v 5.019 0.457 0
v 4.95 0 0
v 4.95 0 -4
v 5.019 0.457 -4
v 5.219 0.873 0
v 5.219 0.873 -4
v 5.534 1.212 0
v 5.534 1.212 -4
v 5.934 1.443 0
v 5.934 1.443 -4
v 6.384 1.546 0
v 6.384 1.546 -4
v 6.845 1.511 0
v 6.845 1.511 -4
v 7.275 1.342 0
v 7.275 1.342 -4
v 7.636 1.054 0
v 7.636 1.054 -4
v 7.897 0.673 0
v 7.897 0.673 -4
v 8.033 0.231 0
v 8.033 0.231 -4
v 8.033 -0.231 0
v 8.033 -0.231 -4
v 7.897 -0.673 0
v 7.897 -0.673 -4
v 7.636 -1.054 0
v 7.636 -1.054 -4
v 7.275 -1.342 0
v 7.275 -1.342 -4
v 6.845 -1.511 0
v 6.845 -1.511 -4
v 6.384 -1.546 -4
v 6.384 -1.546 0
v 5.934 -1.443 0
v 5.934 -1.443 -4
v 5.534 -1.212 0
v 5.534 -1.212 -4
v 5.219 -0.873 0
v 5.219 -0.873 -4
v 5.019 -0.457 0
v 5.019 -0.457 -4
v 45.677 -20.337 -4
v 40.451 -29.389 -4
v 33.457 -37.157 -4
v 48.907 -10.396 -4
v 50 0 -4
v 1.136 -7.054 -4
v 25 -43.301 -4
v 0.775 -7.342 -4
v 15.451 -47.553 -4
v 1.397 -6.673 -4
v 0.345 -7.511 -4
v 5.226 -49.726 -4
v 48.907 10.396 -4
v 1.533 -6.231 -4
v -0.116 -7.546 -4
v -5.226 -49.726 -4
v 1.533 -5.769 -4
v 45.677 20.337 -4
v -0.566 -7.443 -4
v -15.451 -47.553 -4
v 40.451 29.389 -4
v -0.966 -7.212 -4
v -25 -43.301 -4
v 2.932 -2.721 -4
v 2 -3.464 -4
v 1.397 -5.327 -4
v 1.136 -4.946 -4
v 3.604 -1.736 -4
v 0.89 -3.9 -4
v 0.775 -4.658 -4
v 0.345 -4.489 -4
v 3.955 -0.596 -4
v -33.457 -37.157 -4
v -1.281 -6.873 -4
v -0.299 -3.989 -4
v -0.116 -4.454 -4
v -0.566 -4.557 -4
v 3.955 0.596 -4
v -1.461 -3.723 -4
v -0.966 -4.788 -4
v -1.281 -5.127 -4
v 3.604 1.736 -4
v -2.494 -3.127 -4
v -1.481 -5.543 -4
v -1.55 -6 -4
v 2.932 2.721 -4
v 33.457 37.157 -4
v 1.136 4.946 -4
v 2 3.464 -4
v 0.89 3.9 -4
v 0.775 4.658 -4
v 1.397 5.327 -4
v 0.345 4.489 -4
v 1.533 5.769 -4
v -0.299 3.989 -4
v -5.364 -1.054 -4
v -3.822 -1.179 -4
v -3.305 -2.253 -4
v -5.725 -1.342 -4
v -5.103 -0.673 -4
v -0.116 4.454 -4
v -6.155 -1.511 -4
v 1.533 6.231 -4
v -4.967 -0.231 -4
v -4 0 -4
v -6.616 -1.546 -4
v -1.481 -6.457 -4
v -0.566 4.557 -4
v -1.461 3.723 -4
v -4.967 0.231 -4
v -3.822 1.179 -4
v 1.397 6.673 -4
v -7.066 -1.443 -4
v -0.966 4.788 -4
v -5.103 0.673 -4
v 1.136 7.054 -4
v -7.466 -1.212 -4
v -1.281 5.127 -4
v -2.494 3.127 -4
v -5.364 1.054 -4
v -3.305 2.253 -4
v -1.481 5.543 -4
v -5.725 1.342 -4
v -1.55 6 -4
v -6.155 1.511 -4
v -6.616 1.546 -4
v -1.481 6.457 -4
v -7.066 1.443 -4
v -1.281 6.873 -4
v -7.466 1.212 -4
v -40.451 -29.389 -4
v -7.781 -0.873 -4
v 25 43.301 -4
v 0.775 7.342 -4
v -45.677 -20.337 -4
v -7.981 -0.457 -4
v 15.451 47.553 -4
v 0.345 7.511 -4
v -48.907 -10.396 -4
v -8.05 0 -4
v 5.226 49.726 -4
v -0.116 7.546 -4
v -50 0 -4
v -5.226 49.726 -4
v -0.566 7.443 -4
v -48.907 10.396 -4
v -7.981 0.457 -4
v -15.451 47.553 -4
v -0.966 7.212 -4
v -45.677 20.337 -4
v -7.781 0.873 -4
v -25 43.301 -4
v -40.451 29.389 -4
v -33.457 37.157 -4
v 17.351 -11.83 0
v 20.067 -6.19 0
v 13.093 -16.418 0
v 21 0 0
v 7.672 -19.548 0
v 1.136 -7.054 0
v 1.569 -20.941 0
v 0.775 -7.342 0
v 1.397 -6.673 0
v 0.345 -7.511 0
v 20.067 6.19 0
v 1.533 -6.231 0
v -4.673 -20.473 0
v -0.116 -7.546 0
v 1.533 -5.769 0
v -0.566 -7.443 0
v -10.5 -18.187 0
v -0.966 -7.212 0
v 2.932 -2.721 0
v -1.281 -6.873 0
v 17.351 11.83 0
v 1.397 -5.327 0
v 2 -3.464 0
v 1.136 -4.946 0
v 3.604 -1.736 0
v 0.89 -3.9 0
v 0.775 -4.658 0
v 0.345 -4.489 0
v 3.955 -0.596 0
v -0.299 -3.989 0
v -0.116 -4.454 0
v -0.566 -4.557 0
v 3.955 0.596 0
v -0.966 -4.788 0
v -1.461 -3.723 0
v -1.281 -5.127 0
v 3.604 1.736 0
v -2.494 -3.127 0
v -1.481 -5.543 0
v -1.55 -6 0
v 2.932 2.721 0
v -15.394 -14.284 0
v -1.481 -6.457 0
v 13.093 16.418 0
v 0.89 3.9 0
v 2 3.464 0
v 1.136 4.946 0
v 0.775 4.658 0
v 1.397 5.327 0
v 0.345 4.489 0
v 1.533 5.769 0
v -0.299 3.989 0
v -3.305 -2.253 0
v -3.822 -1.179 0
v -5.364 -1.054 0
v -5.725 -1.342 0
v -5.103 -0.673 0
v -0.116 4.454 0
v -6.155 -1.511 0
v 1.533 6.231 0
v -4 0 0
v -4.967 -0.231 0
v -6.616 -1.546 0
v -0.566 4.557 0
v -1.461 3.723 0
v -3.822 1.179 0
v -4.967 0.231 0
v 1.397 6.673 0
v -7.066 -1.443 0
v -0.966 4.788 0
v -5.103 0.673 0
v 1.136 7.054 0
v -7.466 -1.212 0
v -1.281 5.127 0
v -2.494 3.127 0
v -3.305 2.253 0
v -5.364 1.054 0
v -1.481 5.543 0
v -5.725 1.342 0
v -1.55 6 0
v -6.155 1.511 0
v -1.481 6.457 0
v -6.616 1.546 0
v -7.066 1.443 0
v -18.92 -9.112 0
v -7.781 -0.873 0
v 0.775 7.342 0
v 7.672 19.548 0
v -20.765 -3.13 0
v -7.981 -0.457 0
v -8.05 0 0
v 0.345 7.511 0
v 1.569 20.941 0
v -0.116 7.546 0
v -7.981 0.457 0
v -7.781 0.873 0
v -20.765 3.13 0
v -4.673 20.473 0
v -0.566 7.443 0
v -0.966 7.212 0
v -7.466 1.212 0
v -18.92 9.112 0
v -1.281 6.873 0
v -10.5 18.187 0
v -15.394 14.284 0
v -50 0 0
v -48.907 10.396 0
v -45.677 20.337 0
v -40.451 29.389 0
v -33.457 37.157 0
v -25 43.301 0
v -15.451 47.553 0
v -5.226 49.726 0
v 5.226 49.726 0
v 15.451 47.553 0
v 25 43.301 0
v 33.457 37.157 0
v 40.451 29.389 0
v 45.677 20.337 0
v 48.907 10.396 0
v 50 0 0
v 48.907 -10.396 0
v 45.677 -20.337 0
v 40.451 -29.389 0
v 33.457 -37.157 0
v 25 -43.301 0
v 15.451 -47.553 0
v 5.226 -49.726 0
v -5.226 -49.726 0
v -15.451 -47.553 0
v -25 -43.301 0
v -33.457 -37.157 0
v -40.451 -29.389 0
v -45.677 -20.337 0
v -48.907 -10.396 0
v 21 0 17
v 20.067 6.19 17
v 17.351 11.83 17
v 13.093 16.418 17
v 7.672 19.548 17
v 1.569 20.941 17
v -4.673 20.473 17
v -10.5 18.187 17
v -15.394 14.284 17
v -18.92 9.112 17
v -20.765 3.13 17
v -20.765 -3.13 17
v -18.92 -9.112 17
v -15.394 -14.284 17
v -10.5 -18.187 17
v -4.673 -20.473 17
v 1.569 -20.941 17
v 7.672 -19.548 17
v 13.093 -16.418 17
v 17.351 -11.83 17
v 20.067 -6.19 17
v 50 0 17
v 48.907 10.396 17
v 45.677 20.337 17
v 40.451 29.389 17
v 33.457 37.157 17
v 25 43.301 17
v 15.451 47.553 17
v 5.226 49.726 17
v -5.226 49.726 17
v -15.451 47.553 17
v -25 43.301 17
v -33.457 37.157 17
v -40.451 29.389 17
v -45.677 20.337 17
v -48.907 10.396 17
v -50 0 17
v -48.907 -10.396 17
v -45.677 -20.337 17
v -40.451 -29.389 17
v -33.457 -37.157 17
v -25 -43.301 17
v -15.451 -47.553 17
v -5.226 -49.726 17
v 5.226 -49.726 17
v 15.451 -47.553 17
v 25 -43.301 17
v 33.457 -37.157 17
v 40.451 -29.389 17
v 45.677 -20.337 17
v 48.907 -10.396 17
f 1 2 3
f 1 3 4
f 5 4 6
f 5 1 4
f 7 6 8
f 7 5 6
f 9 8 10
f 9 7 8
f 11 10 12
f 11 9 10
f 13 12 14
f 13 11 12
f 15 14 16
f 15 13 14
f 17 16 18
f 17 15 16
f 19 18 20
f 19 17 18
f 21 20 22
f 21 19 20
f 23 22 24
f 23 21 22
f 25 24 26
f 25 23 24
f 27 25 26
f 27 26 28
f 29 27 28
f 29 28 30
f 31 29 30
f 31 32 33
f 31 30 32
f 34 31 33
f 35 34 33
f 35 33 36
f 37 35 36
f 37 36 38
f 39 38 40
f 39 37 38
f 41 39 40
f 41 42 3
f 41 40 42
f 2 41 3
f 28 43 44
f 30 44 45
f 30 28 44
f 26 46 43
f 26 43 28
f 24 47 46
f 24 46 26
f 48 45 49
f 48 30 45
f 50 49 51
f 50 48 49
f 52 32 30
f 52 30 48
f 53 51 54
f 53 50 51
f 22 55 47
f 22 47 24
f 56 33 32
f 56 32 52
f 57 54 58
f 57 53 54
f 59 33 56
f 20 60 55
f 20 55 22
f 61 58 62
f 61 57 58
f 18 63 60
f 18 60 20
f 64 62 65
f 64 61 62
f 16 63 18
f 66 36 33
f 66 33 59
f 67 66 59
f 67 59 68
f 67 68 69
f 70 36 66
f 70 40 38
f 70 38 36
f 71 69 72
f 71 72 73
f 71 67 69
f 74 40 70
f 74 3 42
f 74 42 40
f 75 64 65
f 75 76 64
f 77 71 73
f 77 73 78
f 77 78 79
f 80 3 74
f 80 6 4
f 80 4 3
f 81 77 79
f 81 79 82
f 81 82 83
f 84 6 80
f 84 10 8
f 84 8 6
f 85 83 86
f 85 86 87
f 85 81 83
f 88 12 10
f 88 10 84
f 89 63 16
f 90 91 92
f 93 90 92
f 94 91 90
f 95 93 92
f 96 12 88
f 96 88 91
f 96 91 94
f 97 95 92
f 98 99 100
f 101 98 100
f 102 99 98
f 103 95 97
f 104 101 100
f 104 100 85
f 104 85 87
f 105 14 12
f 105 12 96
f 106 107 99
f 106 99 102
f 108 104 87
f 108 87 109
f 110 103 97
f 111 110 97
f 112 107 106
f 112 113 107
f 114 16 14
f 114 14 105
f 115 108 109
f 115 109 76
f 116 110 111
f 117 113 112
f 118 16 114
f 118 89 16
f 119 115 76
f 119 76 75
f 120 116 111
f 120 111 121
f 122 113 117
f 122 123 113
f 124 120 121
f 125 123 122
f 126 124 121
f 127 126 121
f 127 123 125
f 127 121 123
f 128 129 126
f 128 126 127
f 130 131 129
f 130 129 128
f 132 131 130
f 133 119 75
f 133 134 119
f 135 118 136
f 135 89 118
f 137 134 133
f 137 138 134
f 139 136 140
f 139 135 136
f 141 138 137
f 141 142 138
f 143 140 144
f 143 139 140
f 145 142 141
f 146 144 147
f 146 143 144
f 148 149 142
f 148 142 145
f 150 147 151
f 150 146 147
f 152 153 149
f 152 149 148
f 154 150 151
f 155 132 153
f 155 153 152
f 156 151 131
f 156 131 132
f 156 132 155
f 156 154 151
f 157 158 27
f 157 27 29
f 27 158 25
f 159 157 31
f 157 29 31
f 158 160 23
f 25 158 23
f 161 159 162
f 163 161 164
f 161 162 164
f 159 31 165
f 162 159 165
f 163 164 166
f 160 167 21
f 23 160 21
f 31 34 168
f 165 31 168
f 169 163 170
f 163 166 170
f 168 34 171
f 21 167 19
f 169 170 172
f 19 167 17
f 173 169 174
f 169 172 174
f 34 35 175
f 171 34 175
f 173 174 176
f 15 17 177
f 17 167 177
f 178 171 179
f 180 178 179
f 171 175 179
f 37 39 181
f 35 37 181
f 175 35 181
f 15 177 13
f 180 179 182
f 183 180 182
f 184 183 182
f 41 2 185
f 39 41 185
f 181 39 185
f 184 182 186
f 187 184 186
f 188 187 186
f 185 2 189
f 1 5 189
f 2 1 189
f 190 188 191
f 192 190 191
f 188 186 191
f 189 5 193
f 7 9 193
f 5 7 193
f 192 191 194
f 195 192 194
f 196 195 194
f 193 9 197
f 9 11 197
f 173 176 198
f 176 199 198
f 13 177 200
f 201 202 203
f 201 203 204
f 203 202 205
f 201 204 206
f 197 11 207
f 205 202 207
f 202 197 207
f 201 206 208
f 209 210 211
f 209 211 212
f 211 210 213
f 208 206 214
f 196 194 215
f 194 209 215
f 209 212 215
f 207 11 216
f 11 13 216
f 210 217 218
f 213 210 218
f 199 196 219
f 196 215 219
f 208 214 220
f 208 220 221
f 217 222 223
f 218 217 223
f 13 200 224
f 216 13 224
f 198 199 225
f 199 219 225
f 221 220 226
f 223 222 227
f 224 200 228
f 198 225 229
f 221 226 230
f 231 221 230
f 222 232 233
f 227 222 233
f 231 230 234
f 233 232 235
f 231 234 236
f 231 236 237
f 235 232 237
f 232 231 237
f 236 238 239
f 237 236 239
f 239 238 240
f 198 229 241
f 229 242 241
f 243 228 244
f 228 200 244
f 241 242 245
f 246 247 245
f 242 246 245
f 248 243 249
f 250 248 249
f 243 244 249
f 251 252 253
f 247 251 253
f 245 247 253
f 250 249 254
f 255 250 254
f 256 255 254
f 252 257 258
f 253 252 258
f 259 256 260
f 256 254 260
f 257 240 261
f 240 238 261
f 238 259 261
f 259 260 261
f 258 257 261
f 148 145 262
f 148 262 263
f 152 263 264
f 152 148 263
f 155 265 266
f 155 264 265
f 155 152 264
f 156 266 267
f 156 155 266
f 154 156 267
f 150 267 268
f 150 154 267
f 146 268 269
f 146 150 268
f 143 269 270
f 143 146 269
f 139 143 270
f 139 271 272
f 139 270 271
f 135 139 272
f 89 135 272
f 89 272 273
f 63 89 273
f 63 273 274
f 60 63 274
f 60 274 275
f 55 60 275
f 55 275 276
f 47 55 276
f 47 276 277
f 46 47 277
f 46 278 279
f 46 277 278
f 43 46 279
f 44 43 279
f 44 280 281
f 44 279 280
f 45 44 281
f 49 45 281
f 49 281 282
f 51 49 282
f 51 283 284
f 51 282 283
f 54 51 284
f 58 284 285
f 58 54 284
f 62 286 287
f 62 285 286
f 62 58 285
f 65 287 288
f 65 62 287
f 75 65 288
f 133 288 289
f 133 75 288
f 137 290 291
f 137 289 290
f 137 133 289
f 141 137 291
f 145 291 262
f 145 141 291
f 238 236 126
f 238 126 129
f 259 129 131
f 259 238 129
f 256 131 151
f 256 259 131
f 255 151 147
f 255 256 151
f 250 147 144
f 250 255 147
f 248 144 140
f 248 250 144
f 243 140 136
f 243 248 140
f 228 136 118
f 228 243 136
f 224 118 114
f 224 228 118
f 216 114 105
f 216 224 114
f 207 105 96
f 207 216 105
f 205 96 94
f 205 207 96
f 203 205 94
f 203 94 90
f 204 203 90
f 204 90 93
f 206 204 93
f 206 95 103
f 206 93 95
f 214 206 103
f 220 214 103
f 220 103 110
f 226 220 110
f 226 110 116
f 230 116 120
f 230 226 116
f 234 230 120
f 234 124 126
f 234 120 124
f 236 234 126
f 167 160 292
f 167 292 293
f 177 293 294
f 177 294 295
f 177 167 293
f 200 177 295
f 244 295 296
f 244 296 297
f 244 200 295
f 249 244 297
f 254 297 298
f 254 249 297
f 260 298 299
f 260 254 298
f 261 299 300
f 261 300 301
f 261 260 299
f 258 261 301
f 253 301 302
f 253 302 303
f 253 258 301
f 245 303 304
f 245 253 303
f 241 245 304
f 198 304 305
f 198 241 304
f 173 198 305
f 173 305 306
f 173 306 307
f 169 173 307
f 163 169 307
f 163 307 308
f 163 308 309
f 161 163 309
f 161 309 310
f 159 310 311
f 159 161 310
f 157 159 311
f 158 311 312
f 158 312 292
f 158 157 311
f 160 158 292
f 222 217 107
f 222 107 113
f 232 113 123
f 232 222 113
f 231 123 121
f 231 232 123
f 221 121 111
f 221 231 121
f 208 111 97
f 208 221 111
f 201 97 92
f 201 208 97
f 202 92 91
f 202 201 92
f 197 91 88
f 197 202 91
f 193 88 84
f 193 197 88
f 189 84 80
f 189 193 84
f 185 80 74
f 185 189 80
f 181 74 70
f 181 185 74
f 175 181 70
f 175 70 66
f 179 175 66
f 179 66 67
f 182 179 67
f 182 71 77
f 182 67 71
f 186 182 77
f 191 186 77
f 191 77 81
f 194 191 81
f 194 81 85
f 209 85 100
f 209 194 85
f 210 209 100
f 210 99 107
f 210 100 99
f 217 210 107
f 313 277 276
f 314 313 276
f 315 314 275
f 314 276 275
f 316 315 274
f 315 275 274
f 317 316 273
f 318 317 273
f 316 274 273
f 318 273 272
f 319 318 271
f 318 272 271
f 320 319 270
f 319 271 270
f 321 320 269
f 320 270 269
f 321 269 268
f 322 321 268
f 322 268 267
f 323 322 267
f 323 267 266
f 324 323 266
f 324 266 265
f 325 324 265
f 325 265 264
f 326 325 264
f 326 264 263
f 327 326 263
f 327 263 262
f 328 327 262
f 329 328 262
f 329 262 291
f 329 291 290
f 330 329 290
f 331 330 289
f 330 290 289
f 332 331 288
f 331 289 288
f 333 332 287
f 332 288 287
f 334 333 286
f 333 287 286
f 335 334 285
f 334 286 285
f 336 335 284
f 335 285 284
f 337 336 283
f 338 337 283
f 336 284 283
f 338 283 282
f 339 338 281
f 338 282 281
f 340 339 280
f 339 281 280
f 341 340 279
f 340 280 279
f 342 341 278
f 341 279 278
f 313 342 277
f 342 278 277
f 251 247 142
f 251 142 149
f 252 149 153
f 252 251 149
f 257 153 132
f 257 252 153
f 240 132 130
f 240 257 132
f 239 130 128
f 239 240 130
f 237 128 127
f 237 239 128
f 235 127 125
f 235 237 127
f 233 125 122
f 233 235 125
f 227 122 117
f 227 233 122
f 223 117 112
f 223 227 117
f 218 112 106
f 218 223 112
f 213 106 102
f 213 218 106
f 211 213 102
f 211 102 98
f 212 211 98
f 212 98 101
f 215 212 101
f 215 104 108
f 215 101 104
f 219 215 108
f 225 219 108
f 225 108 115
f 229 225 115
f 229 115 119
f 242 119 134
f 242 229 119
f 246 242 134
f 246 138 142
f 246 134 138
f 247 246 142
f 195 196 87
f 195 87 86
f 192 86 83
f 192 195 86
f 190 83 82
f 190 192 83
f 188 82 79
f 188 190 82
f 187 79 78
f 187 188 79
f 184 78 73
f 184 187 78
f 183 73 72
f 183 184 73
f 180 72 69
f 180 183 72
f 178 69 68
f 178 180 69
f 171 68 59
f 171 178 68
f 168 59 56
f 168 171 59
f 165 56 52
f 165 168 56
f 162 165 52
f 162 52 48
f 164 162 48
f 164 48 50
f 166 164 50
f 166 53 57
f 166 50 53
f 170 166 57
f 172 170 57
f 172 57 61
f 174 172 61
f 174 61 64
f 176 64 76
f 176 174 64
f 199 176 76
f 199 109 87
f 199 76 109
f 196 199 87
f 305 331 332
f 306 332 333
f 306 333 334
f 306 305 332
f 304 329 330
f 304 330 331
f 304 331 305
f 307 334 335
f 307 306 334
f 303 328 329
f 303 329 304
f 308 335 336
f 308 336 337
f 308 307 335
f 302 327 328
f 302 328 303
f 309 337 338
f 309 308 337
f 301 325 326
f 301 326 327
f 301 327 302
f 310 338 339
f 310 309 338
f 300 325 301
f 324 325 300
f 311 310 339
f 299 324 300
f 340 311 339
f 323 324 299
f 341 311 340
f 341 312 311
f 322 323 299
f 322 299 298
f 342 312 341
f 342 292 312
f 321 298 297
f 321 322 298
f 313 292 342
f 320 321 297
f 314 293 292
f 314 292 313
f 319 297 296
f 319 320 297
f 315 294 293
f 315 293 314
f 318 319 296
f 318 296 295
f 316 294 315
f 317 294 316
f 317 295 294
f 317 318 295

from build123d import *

# Parameters (mm, degrees)
SKETCH_1_R               = 50
SKETCH_1_R_2             = 21
EXTRUDE_1_DEPTH          = 17
EXTRUDE_START            = 4
SKETCH_2_R               = 50
EXTRUDE_2_DEPTH          = 4
CUT_EXTRUDE_1_DEPTH      = 74.763134424
CUT_EXTRUDE_1_DEPTH_BACK = 74.763134424
SKETCH_3_R               = 4
SKETCH_3_R_2             = 1.55


with BuildPart() as part:
    # 草图1 → 凸台-拉伸1 (new body)
    with BuildSketch(Plane.XY):
        Circle(SKETCH_1_R)
        Circle(SKETCH_1_R_2, mode=Mode.SUBTRACT)
    extrude(amount=EXTRUDE_1_DEPTH)

    # 草图2 → 凸台-拉伸2 (add)
    with BuildSketch(Plane(origin=(0, 0, 0), x_dir=(-1, 0, 0), z_dir=(0, 0, -1)).offset(EXTRUDE_START)):
        Circle(SKETCH_2_R)
    extrude(amount=-EXTRUDE_2_DEPTH)

    # 草图3 → 切除-拉伸1 (cut, two sides: drawn at the far end of the back side and taken through both)
    with BuildSketch(Plane(origin=(0, 0, -4), x_dir=(-1, 0, 0), z_dir=(0, 0, -1)).offset(-CUT_EXTRUDE_1_DEPTH_BACK)):
        Circle(SKETCH_3_R)
        with Locations((0, 6)):
            Circle(SKETCH_3_R_2)
        with Locations((0, -6)):
            Circle(SKETCH_3_R_2)
        with Locations((-6.5, 0)):
            Circle(SKETCH_3_R_2)
        with Locations((6.5, 0)):
            Circle(SKETCH_3_R_2)
    extrude(amount=CUT_EXTRUDE_1_DEPTH + CUT_EXTRUDE_1_DEPTH_BACK, mode=Mode.SUBTRACT)


solid = part.part
